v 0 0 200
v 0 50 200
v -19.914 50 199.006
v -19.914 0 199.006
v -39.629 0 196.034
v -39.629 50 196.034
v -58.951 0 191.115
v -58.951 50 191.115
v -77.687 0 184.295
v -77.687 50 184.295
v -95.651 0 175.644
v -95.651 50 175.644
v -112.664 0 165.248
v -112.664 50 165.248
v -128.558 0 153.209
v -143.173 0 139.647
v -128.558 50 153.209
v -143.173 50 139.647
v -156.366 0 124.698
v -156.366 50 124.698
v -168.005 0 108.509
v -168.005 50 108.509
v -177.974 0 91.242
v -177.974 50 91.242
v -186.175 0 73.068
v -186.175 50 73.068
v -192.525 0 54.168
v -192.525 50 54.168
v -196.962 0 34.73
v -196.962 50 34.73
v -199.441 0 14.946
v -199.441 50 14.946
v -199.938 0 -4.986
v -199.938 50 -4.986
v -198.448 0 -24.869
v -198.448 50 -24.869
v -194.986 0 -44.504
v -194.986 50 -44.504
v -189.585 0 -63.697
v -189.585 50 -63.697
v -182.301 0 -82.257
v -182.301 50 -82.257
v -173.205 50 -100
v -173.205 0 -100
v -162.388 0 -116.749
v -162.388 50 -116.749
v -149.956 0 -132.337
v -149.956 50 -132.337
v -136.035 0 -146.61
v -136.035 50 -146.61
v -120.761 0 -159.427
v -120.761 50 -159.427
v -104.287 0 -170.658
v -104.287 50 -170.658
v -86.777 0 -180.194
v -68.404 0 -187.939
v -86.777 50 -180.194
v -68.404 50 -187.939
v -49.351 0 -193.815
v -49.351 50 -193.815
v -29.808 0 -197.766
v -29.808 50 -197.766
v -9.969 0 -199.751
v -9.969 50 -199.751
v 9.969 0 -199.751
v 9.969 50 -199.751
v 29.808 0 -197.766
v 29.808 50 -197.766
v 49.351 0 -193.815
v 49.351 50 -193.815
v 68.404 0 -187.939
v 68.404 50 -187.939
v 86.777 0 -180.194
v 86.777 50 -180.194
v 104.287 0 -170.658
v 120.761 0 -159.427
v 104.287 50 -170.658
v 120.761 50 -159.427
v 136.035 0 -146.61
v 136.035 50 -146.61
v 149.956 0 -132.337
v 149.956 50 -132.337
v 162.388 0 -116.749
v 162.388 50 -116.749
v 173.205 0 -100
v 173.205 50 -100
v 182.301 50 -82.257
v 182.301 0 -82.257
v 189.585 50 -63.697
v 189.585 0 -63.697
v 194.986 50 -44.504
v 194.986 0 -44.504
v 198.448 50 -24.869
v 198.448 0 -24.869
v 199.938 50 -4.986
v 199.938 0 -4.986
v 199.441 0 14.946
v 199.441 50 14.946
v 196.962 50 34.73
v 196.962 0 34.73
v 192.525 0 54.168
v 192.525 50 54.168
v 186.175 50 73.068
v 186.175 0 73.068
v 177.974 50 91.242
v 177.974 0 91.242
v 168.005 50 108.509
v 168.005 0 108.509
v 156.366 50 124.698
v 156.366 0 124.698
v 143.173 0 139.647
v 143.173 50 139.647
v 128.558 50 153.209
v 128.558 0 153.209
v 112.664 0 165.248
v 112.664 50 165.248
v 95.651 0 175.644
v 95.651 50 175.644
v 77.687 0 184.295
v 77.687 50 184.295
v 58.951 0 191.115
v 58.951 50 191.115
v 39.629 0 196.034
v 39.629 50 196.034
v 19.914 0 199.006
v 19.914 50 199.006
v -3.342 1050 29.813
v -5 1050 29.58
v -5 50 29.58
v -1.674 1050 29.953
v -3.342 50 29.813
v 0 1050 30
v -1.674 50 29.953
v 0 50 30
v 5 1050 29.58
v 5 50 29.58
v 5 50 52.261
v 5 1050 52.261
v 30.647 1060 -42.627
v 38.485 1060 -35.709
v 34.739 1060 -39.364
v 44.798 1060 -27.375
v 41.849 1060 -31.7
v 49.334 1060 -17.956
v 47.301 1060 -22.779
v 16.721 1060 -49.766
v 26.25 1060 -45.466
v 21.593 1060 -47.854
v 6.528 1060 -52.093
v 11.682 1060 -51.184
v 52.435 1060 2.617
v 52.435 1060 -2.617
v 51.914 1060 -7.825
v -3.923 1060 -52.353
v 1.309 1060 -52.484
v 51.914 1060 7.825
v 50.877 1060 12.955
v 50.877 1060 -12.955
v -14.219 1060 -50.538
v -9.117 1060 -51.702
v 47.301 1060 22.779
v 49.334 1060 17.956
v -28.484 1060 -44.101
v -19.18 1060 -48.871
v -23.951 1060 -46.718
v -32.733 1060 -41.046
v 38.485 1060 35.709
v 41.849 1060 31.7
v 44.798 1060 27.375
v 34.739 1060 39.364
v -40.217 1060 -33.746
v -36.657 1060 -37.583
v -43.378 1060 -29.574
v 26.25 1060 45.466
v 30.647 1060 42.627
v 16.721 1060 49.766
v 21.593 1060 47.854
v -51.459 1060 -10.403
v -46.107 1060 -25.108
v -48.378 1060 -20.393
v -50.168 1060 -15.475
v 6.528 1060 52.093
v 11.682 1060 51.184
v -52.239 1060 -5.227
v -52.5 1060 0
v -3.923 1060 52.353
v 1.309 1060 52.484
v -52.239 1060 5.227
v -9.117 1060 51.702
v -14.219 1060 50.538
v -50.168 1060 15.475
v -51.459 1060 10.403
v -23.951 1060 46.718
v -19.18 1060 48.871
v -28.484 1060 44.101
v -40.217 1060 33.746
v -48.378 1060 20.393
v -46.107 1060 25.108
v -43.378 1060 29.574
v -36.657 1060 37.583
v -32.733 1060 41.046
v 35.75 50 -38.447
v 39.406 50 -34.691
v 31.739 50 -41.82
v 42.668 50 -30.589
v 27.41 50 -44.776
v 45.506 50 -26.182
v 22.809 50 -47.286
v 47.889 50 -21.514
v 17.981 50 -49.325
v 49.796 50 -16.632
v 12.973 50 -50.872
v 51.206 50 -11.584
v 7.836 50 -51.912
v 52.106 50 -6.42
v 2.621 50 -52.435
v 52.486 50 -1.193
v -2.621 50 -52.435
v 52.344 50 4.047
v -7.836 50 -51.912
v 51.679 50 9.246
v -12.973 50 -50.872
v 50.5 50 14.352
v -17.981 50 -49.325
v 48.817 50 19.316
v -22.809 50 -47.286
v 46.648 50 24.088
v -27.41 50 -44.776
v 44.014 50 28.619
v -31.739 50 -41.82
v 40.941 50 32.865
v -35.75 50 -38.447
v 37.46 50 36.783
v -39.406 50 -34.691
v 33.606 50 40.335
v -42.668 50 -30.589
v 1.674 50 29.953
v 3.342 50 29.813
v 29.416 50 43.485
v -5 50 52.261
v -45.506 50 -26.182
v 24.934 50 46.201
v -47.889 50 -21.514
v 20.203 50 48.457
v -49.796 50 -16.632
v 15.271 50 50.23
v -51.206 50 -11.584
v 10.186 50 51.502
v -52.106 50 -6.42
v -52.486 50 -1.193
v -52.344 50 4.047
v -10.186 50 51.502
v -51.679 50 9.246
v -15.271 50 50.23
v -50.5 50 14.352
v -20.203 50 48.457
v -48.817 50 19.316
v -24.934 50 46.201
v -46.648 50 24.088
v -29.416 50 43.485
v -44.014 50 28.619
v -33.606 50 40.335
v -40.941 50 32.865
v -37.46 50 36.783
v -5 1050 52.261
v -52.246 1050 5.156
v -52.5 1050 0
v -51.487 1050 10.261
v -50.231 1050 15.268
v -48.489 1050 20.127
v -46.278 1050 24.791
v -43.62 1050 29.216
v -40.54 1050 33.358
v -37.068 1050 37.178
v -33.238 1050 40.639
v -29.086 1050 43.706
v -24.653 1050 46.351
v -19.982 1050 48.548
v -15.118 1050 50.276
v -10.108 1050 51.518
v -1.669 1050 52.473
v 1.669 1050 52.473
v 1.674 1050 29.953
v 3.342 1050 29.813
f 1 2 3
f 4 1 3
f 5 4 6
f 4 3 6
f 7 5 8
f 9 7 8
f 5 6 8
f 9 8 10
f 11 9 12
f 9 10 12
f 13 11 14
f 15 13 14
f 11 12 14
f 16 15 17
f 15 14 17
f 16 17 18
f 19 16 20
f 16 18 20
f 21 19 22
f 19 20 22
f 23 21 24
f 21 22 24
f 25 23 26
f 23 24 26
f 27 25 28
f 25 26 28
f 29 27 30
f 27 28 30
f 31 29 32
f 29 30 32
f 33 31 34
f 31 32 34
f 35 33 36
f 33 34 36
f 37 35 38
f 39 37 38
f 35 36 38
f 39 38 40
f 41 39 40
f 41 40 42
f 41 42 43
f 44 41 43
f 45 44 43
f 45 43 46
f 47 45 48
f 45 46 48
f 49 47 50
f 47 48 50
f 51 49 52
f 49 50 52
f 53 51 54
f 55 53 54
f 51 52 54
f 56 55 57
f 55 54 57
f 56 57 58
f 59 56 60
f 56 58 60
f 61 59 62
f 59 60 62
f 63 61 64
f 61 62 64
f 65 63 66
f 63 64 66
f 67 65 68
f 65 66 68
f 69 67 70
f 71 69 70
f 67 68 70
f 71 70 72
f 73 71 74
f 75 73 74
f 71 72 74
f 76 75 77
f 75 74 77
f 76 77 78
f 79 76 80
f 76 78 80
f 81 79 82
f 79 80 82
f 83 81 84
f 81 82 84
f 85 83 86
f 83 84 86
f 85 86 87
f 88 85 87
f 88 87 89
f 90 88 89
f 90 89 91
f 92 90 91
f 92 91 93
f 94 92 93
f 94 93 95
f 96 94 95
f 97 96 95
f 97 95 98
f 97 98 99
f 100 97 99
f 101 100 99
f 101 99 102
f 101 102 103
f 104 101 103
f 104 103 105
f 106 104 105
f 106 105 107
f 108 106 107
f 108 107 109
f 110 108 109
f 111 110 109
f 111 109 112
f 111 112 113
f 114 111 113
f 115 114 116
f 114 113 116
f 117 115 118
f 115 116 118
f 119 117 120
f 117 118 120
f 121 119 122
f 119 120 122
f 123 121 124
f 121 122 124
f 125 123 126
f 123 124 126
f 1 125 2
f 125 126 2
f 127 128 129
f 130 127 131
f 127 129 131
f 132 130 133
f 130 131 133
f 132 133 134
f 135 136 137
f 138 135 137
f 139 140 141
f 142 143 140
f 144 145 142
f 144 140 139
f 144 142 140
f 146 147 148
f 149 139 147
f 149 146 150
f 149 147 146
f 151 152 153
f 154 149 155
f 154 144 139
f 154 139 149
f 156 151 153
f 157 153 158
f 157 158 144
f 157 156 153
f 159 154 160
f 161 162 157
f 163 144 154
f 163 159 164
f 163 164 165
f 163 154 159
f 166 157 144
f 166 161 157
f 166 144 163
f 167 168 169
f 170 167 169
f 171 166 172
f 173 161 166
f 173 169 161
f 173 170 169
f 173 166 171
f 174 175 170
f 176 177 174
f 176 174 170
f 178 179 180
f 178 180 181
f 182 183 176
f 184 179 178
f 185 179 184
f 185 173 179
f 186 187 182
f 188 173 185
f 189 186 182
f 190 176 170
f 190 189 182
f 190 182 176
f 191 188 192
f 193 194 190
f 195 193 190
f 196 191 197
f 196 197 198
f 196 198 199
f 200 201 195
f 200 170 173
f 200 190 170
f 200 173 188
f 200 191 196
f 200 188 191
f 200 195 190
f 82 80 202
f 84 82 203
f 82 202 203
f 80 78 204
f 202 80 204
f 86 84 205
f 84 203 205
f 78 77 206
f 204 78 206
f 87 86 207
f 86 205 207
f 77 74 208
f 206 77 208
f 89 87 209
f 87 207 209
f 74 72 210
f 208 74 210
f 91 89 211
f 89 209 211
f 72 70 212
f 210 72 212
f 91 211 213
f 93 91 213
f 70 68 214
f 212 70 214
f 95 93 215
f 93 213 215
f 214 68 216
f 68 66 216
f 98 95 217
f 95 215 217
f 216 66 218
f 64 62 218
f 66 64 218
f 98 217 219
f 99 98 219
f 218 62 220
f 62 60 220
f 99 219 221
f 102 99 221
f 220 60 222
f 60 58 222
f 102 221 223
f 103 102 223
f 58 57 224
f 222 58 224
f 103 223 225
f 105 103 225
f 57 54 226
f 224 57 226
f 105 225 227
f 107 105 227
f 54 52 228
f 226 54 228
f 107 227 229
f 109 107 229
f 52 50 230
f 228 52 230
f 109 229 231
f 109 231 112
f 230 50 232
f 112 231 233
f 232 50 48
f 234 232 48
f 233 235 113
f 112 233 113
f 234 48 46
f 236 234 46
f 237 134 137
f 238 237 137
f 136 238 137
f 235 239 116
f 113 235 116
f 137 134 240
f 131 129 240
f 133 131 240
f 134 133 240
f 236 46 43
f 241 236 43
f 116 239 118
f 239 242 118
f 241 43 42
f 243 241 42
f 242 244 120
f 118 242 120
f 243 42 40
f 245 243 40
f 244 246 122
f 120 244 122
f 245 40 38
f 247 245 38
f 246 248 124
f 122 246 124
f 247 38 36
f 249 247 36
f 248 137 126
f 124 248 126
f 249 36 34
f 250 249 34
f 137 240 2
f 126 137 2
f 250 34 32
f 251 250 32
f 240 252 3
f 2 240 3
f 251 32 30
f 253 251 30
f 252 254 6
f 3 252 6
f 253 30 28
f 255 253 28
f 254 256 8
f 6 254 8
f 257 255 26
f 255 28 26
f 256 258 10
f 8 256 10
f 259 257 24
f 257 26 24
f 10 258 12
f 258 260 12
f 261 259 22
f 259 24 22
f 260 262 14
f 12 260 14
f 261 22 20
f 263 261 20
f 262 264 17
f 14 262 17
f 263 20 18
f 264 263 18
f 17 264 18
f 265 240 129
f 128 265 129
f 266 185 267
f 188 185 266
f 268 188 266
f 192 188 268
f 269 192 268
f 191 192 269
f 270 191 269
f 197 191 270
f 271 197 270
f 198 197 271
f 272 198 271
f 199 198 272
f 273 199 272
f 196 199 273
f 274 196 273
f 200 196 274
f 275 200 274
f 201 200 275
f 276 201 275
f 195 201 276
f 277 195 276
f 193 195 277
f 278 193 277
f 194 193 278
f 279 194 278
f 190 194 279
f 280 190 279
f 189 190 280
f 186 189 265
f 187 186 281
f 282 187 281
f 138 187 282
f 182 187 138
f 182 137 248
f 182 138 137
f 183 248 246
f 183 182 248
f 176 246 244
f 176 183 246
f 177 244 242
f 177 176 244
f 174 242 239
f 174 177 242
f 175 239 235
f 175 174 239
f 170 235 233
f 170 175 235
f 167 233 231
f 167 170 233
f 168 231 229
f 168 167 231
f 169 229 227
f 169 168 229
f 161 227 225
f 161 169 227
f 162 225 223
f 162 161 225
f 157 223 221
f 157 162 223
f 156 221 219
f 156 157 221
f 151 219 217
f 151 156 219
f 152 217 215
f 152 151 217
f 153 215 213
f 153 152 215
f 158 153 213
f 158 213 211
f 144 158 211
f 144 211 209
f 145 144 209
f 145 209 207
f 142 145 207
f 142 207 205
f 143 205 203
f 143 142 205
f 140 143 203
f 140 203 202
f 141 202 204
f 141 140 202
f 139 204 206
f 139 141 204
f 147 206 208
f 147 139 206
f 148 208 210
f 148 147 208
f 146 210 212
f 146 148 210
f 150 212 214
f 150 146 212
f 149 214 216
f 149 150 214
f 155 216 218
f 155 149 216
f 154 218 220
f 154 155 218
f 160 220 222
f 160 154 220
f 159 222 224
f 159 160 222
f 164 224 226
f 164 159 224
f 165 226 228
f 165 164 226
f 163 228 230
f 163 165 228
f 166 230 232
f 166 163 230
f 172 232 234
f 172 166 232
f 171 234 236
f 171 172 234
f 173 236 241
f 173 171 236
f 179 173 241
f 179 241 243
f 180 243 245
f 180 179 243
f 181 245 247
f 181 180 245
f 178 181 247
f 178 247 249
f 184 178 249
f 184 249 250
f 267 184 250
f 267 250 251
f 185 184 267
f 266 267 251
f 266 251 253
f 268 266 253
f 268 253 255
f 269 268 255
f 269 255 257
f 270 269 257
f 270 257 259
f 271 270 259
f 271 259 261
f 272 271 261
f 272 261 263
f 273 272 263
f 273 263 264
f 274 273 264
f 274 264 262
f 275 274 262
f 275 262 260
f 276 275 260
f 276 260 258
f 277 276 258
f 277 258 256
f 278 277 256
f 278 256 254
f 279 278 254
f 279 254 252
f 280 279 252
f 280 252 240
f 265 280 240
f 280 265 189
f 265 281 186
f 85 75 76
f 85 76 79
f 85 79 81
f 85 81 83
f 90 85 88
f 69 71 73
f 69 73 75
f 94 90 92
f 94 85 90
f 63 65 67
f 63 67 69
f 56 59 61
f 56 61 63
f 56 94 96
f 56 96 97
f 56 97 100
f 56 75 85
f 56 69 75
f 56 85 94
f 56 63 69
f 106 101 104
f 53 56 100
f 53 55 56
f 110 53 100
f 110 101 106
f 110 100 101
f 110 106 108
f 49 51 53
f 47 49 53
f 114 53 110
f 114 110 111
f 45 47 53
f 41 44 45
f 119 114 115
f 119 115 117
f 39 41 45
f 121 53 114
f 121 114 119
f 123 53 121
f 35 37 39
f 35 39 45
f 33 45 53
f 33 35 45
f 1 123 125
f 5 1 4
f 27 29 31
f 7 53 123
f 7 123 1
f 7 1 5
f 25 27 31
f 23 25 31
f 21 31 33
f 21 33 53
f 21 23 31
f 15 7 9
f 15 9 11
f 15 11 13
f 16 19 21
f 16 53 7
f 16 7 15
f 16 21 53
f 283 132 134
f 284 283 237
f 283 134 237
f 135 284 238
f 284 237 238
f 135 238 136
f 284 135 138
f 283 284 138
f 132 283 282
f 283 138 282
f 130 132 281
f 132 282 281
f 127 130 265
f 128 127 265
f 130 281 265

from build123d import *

# Parameters (mm, degrees)
ESQUISSE2_R                  = 52.5
CYLINDRE_DEPTH               = 1000
FENTE_DEPTH                  = 1003.752461977
ESQUISSE4_R                  = 200
SOCLE_DEPTH                  = 50
CORPS_D_PLACER_COPIER1_ANGLE = 180
BOSS_EXTRU_4_START           = 10
ESQUISSE5_R                  = 52.5
BOSS_EXTRU_4_DEPTH           = 10


with BuildPart() as part:
    # Esquisse2 → Cylindre (new body)
    with BuildSketch(Plane(origin=(0, 0, 0), x_dir=(1, 0, 0), z_dir=(0, 1, 0))):
        with Locations(Location((0, 0, 0), (0, 0, 270))):
            Circle(ESQUISSE2_R)
    extrude(amount=CYLINDRE_DEPTH)

    # Esquisse3 → Fente (cut, through all)
    with BuildSketch(Plane(origin=(0, 1000, 0), x_dir=(1, 0, 0), z_dir=(0, 1, 0))):
        with BuildLine():
            Line((0, -52.5), (0, -30))
            ThreePointArc((0, -30), (-2.508787808, -29.894915684), (-5, -29.580398915))
            Line((-5, -29.580398915), (-5, -52.261362401))
            ThreePointArc((-5, -52.261362401), (-2.502845775, -52.440306664), (0, -52.5))
        make_face()
        with BuildLine():
            Line((5, -52.261362401), (5, -29.580398915))
            ThreePointArc((5, -29.580398915), (2.508787808, -29.894915684), (0, -30))
            Line((0, -30), (0, -52.5))
            ThreePointArc((0, -52.5), (2.502845775, -52.440306664), (5, -52.261362401))
        make_face()
    extrude(amount=-FENTE_DEPTH, mode=Mode.SUBTRACT)

    # Esquisse4 → Socle (add)
    with BuildSketch(Plane(origin=(0, 1000, 0), x_dir=(1, 0, 0), z_dir=(0, 1, 0))):
        with Locations(Location((0, 0, 0), (0, 0, 270))):
            Circle(ESQUISSE4_R)
    extrude(amount=SOCLE_DEPTH)


with BuildPart() as part_1:
    # Corps-Déplacer/Copier1: moved
    add(part.part.rotate(Axis((0, 525, 0), (0, 0, 1)), CORPS_D_PLACER_COPIER1_ANGLE))

    # Esquisse5 → Boss.-Extru.4 (add)
    with BuildSketch(Plane(origin=(0, 1050, 0), x_dir=(1, 0, 0), z_dir=(0, 1, 0)).offset(BOSS_EXTRU_4_START)):
        with Locations(Location((0, 0, 0), (0, 0, 180))):
            Circle(ESQUISSE5_R)
    extrude(amount=-BOSS_EXTRU_4_DEPTH)


solid = part_1.part
